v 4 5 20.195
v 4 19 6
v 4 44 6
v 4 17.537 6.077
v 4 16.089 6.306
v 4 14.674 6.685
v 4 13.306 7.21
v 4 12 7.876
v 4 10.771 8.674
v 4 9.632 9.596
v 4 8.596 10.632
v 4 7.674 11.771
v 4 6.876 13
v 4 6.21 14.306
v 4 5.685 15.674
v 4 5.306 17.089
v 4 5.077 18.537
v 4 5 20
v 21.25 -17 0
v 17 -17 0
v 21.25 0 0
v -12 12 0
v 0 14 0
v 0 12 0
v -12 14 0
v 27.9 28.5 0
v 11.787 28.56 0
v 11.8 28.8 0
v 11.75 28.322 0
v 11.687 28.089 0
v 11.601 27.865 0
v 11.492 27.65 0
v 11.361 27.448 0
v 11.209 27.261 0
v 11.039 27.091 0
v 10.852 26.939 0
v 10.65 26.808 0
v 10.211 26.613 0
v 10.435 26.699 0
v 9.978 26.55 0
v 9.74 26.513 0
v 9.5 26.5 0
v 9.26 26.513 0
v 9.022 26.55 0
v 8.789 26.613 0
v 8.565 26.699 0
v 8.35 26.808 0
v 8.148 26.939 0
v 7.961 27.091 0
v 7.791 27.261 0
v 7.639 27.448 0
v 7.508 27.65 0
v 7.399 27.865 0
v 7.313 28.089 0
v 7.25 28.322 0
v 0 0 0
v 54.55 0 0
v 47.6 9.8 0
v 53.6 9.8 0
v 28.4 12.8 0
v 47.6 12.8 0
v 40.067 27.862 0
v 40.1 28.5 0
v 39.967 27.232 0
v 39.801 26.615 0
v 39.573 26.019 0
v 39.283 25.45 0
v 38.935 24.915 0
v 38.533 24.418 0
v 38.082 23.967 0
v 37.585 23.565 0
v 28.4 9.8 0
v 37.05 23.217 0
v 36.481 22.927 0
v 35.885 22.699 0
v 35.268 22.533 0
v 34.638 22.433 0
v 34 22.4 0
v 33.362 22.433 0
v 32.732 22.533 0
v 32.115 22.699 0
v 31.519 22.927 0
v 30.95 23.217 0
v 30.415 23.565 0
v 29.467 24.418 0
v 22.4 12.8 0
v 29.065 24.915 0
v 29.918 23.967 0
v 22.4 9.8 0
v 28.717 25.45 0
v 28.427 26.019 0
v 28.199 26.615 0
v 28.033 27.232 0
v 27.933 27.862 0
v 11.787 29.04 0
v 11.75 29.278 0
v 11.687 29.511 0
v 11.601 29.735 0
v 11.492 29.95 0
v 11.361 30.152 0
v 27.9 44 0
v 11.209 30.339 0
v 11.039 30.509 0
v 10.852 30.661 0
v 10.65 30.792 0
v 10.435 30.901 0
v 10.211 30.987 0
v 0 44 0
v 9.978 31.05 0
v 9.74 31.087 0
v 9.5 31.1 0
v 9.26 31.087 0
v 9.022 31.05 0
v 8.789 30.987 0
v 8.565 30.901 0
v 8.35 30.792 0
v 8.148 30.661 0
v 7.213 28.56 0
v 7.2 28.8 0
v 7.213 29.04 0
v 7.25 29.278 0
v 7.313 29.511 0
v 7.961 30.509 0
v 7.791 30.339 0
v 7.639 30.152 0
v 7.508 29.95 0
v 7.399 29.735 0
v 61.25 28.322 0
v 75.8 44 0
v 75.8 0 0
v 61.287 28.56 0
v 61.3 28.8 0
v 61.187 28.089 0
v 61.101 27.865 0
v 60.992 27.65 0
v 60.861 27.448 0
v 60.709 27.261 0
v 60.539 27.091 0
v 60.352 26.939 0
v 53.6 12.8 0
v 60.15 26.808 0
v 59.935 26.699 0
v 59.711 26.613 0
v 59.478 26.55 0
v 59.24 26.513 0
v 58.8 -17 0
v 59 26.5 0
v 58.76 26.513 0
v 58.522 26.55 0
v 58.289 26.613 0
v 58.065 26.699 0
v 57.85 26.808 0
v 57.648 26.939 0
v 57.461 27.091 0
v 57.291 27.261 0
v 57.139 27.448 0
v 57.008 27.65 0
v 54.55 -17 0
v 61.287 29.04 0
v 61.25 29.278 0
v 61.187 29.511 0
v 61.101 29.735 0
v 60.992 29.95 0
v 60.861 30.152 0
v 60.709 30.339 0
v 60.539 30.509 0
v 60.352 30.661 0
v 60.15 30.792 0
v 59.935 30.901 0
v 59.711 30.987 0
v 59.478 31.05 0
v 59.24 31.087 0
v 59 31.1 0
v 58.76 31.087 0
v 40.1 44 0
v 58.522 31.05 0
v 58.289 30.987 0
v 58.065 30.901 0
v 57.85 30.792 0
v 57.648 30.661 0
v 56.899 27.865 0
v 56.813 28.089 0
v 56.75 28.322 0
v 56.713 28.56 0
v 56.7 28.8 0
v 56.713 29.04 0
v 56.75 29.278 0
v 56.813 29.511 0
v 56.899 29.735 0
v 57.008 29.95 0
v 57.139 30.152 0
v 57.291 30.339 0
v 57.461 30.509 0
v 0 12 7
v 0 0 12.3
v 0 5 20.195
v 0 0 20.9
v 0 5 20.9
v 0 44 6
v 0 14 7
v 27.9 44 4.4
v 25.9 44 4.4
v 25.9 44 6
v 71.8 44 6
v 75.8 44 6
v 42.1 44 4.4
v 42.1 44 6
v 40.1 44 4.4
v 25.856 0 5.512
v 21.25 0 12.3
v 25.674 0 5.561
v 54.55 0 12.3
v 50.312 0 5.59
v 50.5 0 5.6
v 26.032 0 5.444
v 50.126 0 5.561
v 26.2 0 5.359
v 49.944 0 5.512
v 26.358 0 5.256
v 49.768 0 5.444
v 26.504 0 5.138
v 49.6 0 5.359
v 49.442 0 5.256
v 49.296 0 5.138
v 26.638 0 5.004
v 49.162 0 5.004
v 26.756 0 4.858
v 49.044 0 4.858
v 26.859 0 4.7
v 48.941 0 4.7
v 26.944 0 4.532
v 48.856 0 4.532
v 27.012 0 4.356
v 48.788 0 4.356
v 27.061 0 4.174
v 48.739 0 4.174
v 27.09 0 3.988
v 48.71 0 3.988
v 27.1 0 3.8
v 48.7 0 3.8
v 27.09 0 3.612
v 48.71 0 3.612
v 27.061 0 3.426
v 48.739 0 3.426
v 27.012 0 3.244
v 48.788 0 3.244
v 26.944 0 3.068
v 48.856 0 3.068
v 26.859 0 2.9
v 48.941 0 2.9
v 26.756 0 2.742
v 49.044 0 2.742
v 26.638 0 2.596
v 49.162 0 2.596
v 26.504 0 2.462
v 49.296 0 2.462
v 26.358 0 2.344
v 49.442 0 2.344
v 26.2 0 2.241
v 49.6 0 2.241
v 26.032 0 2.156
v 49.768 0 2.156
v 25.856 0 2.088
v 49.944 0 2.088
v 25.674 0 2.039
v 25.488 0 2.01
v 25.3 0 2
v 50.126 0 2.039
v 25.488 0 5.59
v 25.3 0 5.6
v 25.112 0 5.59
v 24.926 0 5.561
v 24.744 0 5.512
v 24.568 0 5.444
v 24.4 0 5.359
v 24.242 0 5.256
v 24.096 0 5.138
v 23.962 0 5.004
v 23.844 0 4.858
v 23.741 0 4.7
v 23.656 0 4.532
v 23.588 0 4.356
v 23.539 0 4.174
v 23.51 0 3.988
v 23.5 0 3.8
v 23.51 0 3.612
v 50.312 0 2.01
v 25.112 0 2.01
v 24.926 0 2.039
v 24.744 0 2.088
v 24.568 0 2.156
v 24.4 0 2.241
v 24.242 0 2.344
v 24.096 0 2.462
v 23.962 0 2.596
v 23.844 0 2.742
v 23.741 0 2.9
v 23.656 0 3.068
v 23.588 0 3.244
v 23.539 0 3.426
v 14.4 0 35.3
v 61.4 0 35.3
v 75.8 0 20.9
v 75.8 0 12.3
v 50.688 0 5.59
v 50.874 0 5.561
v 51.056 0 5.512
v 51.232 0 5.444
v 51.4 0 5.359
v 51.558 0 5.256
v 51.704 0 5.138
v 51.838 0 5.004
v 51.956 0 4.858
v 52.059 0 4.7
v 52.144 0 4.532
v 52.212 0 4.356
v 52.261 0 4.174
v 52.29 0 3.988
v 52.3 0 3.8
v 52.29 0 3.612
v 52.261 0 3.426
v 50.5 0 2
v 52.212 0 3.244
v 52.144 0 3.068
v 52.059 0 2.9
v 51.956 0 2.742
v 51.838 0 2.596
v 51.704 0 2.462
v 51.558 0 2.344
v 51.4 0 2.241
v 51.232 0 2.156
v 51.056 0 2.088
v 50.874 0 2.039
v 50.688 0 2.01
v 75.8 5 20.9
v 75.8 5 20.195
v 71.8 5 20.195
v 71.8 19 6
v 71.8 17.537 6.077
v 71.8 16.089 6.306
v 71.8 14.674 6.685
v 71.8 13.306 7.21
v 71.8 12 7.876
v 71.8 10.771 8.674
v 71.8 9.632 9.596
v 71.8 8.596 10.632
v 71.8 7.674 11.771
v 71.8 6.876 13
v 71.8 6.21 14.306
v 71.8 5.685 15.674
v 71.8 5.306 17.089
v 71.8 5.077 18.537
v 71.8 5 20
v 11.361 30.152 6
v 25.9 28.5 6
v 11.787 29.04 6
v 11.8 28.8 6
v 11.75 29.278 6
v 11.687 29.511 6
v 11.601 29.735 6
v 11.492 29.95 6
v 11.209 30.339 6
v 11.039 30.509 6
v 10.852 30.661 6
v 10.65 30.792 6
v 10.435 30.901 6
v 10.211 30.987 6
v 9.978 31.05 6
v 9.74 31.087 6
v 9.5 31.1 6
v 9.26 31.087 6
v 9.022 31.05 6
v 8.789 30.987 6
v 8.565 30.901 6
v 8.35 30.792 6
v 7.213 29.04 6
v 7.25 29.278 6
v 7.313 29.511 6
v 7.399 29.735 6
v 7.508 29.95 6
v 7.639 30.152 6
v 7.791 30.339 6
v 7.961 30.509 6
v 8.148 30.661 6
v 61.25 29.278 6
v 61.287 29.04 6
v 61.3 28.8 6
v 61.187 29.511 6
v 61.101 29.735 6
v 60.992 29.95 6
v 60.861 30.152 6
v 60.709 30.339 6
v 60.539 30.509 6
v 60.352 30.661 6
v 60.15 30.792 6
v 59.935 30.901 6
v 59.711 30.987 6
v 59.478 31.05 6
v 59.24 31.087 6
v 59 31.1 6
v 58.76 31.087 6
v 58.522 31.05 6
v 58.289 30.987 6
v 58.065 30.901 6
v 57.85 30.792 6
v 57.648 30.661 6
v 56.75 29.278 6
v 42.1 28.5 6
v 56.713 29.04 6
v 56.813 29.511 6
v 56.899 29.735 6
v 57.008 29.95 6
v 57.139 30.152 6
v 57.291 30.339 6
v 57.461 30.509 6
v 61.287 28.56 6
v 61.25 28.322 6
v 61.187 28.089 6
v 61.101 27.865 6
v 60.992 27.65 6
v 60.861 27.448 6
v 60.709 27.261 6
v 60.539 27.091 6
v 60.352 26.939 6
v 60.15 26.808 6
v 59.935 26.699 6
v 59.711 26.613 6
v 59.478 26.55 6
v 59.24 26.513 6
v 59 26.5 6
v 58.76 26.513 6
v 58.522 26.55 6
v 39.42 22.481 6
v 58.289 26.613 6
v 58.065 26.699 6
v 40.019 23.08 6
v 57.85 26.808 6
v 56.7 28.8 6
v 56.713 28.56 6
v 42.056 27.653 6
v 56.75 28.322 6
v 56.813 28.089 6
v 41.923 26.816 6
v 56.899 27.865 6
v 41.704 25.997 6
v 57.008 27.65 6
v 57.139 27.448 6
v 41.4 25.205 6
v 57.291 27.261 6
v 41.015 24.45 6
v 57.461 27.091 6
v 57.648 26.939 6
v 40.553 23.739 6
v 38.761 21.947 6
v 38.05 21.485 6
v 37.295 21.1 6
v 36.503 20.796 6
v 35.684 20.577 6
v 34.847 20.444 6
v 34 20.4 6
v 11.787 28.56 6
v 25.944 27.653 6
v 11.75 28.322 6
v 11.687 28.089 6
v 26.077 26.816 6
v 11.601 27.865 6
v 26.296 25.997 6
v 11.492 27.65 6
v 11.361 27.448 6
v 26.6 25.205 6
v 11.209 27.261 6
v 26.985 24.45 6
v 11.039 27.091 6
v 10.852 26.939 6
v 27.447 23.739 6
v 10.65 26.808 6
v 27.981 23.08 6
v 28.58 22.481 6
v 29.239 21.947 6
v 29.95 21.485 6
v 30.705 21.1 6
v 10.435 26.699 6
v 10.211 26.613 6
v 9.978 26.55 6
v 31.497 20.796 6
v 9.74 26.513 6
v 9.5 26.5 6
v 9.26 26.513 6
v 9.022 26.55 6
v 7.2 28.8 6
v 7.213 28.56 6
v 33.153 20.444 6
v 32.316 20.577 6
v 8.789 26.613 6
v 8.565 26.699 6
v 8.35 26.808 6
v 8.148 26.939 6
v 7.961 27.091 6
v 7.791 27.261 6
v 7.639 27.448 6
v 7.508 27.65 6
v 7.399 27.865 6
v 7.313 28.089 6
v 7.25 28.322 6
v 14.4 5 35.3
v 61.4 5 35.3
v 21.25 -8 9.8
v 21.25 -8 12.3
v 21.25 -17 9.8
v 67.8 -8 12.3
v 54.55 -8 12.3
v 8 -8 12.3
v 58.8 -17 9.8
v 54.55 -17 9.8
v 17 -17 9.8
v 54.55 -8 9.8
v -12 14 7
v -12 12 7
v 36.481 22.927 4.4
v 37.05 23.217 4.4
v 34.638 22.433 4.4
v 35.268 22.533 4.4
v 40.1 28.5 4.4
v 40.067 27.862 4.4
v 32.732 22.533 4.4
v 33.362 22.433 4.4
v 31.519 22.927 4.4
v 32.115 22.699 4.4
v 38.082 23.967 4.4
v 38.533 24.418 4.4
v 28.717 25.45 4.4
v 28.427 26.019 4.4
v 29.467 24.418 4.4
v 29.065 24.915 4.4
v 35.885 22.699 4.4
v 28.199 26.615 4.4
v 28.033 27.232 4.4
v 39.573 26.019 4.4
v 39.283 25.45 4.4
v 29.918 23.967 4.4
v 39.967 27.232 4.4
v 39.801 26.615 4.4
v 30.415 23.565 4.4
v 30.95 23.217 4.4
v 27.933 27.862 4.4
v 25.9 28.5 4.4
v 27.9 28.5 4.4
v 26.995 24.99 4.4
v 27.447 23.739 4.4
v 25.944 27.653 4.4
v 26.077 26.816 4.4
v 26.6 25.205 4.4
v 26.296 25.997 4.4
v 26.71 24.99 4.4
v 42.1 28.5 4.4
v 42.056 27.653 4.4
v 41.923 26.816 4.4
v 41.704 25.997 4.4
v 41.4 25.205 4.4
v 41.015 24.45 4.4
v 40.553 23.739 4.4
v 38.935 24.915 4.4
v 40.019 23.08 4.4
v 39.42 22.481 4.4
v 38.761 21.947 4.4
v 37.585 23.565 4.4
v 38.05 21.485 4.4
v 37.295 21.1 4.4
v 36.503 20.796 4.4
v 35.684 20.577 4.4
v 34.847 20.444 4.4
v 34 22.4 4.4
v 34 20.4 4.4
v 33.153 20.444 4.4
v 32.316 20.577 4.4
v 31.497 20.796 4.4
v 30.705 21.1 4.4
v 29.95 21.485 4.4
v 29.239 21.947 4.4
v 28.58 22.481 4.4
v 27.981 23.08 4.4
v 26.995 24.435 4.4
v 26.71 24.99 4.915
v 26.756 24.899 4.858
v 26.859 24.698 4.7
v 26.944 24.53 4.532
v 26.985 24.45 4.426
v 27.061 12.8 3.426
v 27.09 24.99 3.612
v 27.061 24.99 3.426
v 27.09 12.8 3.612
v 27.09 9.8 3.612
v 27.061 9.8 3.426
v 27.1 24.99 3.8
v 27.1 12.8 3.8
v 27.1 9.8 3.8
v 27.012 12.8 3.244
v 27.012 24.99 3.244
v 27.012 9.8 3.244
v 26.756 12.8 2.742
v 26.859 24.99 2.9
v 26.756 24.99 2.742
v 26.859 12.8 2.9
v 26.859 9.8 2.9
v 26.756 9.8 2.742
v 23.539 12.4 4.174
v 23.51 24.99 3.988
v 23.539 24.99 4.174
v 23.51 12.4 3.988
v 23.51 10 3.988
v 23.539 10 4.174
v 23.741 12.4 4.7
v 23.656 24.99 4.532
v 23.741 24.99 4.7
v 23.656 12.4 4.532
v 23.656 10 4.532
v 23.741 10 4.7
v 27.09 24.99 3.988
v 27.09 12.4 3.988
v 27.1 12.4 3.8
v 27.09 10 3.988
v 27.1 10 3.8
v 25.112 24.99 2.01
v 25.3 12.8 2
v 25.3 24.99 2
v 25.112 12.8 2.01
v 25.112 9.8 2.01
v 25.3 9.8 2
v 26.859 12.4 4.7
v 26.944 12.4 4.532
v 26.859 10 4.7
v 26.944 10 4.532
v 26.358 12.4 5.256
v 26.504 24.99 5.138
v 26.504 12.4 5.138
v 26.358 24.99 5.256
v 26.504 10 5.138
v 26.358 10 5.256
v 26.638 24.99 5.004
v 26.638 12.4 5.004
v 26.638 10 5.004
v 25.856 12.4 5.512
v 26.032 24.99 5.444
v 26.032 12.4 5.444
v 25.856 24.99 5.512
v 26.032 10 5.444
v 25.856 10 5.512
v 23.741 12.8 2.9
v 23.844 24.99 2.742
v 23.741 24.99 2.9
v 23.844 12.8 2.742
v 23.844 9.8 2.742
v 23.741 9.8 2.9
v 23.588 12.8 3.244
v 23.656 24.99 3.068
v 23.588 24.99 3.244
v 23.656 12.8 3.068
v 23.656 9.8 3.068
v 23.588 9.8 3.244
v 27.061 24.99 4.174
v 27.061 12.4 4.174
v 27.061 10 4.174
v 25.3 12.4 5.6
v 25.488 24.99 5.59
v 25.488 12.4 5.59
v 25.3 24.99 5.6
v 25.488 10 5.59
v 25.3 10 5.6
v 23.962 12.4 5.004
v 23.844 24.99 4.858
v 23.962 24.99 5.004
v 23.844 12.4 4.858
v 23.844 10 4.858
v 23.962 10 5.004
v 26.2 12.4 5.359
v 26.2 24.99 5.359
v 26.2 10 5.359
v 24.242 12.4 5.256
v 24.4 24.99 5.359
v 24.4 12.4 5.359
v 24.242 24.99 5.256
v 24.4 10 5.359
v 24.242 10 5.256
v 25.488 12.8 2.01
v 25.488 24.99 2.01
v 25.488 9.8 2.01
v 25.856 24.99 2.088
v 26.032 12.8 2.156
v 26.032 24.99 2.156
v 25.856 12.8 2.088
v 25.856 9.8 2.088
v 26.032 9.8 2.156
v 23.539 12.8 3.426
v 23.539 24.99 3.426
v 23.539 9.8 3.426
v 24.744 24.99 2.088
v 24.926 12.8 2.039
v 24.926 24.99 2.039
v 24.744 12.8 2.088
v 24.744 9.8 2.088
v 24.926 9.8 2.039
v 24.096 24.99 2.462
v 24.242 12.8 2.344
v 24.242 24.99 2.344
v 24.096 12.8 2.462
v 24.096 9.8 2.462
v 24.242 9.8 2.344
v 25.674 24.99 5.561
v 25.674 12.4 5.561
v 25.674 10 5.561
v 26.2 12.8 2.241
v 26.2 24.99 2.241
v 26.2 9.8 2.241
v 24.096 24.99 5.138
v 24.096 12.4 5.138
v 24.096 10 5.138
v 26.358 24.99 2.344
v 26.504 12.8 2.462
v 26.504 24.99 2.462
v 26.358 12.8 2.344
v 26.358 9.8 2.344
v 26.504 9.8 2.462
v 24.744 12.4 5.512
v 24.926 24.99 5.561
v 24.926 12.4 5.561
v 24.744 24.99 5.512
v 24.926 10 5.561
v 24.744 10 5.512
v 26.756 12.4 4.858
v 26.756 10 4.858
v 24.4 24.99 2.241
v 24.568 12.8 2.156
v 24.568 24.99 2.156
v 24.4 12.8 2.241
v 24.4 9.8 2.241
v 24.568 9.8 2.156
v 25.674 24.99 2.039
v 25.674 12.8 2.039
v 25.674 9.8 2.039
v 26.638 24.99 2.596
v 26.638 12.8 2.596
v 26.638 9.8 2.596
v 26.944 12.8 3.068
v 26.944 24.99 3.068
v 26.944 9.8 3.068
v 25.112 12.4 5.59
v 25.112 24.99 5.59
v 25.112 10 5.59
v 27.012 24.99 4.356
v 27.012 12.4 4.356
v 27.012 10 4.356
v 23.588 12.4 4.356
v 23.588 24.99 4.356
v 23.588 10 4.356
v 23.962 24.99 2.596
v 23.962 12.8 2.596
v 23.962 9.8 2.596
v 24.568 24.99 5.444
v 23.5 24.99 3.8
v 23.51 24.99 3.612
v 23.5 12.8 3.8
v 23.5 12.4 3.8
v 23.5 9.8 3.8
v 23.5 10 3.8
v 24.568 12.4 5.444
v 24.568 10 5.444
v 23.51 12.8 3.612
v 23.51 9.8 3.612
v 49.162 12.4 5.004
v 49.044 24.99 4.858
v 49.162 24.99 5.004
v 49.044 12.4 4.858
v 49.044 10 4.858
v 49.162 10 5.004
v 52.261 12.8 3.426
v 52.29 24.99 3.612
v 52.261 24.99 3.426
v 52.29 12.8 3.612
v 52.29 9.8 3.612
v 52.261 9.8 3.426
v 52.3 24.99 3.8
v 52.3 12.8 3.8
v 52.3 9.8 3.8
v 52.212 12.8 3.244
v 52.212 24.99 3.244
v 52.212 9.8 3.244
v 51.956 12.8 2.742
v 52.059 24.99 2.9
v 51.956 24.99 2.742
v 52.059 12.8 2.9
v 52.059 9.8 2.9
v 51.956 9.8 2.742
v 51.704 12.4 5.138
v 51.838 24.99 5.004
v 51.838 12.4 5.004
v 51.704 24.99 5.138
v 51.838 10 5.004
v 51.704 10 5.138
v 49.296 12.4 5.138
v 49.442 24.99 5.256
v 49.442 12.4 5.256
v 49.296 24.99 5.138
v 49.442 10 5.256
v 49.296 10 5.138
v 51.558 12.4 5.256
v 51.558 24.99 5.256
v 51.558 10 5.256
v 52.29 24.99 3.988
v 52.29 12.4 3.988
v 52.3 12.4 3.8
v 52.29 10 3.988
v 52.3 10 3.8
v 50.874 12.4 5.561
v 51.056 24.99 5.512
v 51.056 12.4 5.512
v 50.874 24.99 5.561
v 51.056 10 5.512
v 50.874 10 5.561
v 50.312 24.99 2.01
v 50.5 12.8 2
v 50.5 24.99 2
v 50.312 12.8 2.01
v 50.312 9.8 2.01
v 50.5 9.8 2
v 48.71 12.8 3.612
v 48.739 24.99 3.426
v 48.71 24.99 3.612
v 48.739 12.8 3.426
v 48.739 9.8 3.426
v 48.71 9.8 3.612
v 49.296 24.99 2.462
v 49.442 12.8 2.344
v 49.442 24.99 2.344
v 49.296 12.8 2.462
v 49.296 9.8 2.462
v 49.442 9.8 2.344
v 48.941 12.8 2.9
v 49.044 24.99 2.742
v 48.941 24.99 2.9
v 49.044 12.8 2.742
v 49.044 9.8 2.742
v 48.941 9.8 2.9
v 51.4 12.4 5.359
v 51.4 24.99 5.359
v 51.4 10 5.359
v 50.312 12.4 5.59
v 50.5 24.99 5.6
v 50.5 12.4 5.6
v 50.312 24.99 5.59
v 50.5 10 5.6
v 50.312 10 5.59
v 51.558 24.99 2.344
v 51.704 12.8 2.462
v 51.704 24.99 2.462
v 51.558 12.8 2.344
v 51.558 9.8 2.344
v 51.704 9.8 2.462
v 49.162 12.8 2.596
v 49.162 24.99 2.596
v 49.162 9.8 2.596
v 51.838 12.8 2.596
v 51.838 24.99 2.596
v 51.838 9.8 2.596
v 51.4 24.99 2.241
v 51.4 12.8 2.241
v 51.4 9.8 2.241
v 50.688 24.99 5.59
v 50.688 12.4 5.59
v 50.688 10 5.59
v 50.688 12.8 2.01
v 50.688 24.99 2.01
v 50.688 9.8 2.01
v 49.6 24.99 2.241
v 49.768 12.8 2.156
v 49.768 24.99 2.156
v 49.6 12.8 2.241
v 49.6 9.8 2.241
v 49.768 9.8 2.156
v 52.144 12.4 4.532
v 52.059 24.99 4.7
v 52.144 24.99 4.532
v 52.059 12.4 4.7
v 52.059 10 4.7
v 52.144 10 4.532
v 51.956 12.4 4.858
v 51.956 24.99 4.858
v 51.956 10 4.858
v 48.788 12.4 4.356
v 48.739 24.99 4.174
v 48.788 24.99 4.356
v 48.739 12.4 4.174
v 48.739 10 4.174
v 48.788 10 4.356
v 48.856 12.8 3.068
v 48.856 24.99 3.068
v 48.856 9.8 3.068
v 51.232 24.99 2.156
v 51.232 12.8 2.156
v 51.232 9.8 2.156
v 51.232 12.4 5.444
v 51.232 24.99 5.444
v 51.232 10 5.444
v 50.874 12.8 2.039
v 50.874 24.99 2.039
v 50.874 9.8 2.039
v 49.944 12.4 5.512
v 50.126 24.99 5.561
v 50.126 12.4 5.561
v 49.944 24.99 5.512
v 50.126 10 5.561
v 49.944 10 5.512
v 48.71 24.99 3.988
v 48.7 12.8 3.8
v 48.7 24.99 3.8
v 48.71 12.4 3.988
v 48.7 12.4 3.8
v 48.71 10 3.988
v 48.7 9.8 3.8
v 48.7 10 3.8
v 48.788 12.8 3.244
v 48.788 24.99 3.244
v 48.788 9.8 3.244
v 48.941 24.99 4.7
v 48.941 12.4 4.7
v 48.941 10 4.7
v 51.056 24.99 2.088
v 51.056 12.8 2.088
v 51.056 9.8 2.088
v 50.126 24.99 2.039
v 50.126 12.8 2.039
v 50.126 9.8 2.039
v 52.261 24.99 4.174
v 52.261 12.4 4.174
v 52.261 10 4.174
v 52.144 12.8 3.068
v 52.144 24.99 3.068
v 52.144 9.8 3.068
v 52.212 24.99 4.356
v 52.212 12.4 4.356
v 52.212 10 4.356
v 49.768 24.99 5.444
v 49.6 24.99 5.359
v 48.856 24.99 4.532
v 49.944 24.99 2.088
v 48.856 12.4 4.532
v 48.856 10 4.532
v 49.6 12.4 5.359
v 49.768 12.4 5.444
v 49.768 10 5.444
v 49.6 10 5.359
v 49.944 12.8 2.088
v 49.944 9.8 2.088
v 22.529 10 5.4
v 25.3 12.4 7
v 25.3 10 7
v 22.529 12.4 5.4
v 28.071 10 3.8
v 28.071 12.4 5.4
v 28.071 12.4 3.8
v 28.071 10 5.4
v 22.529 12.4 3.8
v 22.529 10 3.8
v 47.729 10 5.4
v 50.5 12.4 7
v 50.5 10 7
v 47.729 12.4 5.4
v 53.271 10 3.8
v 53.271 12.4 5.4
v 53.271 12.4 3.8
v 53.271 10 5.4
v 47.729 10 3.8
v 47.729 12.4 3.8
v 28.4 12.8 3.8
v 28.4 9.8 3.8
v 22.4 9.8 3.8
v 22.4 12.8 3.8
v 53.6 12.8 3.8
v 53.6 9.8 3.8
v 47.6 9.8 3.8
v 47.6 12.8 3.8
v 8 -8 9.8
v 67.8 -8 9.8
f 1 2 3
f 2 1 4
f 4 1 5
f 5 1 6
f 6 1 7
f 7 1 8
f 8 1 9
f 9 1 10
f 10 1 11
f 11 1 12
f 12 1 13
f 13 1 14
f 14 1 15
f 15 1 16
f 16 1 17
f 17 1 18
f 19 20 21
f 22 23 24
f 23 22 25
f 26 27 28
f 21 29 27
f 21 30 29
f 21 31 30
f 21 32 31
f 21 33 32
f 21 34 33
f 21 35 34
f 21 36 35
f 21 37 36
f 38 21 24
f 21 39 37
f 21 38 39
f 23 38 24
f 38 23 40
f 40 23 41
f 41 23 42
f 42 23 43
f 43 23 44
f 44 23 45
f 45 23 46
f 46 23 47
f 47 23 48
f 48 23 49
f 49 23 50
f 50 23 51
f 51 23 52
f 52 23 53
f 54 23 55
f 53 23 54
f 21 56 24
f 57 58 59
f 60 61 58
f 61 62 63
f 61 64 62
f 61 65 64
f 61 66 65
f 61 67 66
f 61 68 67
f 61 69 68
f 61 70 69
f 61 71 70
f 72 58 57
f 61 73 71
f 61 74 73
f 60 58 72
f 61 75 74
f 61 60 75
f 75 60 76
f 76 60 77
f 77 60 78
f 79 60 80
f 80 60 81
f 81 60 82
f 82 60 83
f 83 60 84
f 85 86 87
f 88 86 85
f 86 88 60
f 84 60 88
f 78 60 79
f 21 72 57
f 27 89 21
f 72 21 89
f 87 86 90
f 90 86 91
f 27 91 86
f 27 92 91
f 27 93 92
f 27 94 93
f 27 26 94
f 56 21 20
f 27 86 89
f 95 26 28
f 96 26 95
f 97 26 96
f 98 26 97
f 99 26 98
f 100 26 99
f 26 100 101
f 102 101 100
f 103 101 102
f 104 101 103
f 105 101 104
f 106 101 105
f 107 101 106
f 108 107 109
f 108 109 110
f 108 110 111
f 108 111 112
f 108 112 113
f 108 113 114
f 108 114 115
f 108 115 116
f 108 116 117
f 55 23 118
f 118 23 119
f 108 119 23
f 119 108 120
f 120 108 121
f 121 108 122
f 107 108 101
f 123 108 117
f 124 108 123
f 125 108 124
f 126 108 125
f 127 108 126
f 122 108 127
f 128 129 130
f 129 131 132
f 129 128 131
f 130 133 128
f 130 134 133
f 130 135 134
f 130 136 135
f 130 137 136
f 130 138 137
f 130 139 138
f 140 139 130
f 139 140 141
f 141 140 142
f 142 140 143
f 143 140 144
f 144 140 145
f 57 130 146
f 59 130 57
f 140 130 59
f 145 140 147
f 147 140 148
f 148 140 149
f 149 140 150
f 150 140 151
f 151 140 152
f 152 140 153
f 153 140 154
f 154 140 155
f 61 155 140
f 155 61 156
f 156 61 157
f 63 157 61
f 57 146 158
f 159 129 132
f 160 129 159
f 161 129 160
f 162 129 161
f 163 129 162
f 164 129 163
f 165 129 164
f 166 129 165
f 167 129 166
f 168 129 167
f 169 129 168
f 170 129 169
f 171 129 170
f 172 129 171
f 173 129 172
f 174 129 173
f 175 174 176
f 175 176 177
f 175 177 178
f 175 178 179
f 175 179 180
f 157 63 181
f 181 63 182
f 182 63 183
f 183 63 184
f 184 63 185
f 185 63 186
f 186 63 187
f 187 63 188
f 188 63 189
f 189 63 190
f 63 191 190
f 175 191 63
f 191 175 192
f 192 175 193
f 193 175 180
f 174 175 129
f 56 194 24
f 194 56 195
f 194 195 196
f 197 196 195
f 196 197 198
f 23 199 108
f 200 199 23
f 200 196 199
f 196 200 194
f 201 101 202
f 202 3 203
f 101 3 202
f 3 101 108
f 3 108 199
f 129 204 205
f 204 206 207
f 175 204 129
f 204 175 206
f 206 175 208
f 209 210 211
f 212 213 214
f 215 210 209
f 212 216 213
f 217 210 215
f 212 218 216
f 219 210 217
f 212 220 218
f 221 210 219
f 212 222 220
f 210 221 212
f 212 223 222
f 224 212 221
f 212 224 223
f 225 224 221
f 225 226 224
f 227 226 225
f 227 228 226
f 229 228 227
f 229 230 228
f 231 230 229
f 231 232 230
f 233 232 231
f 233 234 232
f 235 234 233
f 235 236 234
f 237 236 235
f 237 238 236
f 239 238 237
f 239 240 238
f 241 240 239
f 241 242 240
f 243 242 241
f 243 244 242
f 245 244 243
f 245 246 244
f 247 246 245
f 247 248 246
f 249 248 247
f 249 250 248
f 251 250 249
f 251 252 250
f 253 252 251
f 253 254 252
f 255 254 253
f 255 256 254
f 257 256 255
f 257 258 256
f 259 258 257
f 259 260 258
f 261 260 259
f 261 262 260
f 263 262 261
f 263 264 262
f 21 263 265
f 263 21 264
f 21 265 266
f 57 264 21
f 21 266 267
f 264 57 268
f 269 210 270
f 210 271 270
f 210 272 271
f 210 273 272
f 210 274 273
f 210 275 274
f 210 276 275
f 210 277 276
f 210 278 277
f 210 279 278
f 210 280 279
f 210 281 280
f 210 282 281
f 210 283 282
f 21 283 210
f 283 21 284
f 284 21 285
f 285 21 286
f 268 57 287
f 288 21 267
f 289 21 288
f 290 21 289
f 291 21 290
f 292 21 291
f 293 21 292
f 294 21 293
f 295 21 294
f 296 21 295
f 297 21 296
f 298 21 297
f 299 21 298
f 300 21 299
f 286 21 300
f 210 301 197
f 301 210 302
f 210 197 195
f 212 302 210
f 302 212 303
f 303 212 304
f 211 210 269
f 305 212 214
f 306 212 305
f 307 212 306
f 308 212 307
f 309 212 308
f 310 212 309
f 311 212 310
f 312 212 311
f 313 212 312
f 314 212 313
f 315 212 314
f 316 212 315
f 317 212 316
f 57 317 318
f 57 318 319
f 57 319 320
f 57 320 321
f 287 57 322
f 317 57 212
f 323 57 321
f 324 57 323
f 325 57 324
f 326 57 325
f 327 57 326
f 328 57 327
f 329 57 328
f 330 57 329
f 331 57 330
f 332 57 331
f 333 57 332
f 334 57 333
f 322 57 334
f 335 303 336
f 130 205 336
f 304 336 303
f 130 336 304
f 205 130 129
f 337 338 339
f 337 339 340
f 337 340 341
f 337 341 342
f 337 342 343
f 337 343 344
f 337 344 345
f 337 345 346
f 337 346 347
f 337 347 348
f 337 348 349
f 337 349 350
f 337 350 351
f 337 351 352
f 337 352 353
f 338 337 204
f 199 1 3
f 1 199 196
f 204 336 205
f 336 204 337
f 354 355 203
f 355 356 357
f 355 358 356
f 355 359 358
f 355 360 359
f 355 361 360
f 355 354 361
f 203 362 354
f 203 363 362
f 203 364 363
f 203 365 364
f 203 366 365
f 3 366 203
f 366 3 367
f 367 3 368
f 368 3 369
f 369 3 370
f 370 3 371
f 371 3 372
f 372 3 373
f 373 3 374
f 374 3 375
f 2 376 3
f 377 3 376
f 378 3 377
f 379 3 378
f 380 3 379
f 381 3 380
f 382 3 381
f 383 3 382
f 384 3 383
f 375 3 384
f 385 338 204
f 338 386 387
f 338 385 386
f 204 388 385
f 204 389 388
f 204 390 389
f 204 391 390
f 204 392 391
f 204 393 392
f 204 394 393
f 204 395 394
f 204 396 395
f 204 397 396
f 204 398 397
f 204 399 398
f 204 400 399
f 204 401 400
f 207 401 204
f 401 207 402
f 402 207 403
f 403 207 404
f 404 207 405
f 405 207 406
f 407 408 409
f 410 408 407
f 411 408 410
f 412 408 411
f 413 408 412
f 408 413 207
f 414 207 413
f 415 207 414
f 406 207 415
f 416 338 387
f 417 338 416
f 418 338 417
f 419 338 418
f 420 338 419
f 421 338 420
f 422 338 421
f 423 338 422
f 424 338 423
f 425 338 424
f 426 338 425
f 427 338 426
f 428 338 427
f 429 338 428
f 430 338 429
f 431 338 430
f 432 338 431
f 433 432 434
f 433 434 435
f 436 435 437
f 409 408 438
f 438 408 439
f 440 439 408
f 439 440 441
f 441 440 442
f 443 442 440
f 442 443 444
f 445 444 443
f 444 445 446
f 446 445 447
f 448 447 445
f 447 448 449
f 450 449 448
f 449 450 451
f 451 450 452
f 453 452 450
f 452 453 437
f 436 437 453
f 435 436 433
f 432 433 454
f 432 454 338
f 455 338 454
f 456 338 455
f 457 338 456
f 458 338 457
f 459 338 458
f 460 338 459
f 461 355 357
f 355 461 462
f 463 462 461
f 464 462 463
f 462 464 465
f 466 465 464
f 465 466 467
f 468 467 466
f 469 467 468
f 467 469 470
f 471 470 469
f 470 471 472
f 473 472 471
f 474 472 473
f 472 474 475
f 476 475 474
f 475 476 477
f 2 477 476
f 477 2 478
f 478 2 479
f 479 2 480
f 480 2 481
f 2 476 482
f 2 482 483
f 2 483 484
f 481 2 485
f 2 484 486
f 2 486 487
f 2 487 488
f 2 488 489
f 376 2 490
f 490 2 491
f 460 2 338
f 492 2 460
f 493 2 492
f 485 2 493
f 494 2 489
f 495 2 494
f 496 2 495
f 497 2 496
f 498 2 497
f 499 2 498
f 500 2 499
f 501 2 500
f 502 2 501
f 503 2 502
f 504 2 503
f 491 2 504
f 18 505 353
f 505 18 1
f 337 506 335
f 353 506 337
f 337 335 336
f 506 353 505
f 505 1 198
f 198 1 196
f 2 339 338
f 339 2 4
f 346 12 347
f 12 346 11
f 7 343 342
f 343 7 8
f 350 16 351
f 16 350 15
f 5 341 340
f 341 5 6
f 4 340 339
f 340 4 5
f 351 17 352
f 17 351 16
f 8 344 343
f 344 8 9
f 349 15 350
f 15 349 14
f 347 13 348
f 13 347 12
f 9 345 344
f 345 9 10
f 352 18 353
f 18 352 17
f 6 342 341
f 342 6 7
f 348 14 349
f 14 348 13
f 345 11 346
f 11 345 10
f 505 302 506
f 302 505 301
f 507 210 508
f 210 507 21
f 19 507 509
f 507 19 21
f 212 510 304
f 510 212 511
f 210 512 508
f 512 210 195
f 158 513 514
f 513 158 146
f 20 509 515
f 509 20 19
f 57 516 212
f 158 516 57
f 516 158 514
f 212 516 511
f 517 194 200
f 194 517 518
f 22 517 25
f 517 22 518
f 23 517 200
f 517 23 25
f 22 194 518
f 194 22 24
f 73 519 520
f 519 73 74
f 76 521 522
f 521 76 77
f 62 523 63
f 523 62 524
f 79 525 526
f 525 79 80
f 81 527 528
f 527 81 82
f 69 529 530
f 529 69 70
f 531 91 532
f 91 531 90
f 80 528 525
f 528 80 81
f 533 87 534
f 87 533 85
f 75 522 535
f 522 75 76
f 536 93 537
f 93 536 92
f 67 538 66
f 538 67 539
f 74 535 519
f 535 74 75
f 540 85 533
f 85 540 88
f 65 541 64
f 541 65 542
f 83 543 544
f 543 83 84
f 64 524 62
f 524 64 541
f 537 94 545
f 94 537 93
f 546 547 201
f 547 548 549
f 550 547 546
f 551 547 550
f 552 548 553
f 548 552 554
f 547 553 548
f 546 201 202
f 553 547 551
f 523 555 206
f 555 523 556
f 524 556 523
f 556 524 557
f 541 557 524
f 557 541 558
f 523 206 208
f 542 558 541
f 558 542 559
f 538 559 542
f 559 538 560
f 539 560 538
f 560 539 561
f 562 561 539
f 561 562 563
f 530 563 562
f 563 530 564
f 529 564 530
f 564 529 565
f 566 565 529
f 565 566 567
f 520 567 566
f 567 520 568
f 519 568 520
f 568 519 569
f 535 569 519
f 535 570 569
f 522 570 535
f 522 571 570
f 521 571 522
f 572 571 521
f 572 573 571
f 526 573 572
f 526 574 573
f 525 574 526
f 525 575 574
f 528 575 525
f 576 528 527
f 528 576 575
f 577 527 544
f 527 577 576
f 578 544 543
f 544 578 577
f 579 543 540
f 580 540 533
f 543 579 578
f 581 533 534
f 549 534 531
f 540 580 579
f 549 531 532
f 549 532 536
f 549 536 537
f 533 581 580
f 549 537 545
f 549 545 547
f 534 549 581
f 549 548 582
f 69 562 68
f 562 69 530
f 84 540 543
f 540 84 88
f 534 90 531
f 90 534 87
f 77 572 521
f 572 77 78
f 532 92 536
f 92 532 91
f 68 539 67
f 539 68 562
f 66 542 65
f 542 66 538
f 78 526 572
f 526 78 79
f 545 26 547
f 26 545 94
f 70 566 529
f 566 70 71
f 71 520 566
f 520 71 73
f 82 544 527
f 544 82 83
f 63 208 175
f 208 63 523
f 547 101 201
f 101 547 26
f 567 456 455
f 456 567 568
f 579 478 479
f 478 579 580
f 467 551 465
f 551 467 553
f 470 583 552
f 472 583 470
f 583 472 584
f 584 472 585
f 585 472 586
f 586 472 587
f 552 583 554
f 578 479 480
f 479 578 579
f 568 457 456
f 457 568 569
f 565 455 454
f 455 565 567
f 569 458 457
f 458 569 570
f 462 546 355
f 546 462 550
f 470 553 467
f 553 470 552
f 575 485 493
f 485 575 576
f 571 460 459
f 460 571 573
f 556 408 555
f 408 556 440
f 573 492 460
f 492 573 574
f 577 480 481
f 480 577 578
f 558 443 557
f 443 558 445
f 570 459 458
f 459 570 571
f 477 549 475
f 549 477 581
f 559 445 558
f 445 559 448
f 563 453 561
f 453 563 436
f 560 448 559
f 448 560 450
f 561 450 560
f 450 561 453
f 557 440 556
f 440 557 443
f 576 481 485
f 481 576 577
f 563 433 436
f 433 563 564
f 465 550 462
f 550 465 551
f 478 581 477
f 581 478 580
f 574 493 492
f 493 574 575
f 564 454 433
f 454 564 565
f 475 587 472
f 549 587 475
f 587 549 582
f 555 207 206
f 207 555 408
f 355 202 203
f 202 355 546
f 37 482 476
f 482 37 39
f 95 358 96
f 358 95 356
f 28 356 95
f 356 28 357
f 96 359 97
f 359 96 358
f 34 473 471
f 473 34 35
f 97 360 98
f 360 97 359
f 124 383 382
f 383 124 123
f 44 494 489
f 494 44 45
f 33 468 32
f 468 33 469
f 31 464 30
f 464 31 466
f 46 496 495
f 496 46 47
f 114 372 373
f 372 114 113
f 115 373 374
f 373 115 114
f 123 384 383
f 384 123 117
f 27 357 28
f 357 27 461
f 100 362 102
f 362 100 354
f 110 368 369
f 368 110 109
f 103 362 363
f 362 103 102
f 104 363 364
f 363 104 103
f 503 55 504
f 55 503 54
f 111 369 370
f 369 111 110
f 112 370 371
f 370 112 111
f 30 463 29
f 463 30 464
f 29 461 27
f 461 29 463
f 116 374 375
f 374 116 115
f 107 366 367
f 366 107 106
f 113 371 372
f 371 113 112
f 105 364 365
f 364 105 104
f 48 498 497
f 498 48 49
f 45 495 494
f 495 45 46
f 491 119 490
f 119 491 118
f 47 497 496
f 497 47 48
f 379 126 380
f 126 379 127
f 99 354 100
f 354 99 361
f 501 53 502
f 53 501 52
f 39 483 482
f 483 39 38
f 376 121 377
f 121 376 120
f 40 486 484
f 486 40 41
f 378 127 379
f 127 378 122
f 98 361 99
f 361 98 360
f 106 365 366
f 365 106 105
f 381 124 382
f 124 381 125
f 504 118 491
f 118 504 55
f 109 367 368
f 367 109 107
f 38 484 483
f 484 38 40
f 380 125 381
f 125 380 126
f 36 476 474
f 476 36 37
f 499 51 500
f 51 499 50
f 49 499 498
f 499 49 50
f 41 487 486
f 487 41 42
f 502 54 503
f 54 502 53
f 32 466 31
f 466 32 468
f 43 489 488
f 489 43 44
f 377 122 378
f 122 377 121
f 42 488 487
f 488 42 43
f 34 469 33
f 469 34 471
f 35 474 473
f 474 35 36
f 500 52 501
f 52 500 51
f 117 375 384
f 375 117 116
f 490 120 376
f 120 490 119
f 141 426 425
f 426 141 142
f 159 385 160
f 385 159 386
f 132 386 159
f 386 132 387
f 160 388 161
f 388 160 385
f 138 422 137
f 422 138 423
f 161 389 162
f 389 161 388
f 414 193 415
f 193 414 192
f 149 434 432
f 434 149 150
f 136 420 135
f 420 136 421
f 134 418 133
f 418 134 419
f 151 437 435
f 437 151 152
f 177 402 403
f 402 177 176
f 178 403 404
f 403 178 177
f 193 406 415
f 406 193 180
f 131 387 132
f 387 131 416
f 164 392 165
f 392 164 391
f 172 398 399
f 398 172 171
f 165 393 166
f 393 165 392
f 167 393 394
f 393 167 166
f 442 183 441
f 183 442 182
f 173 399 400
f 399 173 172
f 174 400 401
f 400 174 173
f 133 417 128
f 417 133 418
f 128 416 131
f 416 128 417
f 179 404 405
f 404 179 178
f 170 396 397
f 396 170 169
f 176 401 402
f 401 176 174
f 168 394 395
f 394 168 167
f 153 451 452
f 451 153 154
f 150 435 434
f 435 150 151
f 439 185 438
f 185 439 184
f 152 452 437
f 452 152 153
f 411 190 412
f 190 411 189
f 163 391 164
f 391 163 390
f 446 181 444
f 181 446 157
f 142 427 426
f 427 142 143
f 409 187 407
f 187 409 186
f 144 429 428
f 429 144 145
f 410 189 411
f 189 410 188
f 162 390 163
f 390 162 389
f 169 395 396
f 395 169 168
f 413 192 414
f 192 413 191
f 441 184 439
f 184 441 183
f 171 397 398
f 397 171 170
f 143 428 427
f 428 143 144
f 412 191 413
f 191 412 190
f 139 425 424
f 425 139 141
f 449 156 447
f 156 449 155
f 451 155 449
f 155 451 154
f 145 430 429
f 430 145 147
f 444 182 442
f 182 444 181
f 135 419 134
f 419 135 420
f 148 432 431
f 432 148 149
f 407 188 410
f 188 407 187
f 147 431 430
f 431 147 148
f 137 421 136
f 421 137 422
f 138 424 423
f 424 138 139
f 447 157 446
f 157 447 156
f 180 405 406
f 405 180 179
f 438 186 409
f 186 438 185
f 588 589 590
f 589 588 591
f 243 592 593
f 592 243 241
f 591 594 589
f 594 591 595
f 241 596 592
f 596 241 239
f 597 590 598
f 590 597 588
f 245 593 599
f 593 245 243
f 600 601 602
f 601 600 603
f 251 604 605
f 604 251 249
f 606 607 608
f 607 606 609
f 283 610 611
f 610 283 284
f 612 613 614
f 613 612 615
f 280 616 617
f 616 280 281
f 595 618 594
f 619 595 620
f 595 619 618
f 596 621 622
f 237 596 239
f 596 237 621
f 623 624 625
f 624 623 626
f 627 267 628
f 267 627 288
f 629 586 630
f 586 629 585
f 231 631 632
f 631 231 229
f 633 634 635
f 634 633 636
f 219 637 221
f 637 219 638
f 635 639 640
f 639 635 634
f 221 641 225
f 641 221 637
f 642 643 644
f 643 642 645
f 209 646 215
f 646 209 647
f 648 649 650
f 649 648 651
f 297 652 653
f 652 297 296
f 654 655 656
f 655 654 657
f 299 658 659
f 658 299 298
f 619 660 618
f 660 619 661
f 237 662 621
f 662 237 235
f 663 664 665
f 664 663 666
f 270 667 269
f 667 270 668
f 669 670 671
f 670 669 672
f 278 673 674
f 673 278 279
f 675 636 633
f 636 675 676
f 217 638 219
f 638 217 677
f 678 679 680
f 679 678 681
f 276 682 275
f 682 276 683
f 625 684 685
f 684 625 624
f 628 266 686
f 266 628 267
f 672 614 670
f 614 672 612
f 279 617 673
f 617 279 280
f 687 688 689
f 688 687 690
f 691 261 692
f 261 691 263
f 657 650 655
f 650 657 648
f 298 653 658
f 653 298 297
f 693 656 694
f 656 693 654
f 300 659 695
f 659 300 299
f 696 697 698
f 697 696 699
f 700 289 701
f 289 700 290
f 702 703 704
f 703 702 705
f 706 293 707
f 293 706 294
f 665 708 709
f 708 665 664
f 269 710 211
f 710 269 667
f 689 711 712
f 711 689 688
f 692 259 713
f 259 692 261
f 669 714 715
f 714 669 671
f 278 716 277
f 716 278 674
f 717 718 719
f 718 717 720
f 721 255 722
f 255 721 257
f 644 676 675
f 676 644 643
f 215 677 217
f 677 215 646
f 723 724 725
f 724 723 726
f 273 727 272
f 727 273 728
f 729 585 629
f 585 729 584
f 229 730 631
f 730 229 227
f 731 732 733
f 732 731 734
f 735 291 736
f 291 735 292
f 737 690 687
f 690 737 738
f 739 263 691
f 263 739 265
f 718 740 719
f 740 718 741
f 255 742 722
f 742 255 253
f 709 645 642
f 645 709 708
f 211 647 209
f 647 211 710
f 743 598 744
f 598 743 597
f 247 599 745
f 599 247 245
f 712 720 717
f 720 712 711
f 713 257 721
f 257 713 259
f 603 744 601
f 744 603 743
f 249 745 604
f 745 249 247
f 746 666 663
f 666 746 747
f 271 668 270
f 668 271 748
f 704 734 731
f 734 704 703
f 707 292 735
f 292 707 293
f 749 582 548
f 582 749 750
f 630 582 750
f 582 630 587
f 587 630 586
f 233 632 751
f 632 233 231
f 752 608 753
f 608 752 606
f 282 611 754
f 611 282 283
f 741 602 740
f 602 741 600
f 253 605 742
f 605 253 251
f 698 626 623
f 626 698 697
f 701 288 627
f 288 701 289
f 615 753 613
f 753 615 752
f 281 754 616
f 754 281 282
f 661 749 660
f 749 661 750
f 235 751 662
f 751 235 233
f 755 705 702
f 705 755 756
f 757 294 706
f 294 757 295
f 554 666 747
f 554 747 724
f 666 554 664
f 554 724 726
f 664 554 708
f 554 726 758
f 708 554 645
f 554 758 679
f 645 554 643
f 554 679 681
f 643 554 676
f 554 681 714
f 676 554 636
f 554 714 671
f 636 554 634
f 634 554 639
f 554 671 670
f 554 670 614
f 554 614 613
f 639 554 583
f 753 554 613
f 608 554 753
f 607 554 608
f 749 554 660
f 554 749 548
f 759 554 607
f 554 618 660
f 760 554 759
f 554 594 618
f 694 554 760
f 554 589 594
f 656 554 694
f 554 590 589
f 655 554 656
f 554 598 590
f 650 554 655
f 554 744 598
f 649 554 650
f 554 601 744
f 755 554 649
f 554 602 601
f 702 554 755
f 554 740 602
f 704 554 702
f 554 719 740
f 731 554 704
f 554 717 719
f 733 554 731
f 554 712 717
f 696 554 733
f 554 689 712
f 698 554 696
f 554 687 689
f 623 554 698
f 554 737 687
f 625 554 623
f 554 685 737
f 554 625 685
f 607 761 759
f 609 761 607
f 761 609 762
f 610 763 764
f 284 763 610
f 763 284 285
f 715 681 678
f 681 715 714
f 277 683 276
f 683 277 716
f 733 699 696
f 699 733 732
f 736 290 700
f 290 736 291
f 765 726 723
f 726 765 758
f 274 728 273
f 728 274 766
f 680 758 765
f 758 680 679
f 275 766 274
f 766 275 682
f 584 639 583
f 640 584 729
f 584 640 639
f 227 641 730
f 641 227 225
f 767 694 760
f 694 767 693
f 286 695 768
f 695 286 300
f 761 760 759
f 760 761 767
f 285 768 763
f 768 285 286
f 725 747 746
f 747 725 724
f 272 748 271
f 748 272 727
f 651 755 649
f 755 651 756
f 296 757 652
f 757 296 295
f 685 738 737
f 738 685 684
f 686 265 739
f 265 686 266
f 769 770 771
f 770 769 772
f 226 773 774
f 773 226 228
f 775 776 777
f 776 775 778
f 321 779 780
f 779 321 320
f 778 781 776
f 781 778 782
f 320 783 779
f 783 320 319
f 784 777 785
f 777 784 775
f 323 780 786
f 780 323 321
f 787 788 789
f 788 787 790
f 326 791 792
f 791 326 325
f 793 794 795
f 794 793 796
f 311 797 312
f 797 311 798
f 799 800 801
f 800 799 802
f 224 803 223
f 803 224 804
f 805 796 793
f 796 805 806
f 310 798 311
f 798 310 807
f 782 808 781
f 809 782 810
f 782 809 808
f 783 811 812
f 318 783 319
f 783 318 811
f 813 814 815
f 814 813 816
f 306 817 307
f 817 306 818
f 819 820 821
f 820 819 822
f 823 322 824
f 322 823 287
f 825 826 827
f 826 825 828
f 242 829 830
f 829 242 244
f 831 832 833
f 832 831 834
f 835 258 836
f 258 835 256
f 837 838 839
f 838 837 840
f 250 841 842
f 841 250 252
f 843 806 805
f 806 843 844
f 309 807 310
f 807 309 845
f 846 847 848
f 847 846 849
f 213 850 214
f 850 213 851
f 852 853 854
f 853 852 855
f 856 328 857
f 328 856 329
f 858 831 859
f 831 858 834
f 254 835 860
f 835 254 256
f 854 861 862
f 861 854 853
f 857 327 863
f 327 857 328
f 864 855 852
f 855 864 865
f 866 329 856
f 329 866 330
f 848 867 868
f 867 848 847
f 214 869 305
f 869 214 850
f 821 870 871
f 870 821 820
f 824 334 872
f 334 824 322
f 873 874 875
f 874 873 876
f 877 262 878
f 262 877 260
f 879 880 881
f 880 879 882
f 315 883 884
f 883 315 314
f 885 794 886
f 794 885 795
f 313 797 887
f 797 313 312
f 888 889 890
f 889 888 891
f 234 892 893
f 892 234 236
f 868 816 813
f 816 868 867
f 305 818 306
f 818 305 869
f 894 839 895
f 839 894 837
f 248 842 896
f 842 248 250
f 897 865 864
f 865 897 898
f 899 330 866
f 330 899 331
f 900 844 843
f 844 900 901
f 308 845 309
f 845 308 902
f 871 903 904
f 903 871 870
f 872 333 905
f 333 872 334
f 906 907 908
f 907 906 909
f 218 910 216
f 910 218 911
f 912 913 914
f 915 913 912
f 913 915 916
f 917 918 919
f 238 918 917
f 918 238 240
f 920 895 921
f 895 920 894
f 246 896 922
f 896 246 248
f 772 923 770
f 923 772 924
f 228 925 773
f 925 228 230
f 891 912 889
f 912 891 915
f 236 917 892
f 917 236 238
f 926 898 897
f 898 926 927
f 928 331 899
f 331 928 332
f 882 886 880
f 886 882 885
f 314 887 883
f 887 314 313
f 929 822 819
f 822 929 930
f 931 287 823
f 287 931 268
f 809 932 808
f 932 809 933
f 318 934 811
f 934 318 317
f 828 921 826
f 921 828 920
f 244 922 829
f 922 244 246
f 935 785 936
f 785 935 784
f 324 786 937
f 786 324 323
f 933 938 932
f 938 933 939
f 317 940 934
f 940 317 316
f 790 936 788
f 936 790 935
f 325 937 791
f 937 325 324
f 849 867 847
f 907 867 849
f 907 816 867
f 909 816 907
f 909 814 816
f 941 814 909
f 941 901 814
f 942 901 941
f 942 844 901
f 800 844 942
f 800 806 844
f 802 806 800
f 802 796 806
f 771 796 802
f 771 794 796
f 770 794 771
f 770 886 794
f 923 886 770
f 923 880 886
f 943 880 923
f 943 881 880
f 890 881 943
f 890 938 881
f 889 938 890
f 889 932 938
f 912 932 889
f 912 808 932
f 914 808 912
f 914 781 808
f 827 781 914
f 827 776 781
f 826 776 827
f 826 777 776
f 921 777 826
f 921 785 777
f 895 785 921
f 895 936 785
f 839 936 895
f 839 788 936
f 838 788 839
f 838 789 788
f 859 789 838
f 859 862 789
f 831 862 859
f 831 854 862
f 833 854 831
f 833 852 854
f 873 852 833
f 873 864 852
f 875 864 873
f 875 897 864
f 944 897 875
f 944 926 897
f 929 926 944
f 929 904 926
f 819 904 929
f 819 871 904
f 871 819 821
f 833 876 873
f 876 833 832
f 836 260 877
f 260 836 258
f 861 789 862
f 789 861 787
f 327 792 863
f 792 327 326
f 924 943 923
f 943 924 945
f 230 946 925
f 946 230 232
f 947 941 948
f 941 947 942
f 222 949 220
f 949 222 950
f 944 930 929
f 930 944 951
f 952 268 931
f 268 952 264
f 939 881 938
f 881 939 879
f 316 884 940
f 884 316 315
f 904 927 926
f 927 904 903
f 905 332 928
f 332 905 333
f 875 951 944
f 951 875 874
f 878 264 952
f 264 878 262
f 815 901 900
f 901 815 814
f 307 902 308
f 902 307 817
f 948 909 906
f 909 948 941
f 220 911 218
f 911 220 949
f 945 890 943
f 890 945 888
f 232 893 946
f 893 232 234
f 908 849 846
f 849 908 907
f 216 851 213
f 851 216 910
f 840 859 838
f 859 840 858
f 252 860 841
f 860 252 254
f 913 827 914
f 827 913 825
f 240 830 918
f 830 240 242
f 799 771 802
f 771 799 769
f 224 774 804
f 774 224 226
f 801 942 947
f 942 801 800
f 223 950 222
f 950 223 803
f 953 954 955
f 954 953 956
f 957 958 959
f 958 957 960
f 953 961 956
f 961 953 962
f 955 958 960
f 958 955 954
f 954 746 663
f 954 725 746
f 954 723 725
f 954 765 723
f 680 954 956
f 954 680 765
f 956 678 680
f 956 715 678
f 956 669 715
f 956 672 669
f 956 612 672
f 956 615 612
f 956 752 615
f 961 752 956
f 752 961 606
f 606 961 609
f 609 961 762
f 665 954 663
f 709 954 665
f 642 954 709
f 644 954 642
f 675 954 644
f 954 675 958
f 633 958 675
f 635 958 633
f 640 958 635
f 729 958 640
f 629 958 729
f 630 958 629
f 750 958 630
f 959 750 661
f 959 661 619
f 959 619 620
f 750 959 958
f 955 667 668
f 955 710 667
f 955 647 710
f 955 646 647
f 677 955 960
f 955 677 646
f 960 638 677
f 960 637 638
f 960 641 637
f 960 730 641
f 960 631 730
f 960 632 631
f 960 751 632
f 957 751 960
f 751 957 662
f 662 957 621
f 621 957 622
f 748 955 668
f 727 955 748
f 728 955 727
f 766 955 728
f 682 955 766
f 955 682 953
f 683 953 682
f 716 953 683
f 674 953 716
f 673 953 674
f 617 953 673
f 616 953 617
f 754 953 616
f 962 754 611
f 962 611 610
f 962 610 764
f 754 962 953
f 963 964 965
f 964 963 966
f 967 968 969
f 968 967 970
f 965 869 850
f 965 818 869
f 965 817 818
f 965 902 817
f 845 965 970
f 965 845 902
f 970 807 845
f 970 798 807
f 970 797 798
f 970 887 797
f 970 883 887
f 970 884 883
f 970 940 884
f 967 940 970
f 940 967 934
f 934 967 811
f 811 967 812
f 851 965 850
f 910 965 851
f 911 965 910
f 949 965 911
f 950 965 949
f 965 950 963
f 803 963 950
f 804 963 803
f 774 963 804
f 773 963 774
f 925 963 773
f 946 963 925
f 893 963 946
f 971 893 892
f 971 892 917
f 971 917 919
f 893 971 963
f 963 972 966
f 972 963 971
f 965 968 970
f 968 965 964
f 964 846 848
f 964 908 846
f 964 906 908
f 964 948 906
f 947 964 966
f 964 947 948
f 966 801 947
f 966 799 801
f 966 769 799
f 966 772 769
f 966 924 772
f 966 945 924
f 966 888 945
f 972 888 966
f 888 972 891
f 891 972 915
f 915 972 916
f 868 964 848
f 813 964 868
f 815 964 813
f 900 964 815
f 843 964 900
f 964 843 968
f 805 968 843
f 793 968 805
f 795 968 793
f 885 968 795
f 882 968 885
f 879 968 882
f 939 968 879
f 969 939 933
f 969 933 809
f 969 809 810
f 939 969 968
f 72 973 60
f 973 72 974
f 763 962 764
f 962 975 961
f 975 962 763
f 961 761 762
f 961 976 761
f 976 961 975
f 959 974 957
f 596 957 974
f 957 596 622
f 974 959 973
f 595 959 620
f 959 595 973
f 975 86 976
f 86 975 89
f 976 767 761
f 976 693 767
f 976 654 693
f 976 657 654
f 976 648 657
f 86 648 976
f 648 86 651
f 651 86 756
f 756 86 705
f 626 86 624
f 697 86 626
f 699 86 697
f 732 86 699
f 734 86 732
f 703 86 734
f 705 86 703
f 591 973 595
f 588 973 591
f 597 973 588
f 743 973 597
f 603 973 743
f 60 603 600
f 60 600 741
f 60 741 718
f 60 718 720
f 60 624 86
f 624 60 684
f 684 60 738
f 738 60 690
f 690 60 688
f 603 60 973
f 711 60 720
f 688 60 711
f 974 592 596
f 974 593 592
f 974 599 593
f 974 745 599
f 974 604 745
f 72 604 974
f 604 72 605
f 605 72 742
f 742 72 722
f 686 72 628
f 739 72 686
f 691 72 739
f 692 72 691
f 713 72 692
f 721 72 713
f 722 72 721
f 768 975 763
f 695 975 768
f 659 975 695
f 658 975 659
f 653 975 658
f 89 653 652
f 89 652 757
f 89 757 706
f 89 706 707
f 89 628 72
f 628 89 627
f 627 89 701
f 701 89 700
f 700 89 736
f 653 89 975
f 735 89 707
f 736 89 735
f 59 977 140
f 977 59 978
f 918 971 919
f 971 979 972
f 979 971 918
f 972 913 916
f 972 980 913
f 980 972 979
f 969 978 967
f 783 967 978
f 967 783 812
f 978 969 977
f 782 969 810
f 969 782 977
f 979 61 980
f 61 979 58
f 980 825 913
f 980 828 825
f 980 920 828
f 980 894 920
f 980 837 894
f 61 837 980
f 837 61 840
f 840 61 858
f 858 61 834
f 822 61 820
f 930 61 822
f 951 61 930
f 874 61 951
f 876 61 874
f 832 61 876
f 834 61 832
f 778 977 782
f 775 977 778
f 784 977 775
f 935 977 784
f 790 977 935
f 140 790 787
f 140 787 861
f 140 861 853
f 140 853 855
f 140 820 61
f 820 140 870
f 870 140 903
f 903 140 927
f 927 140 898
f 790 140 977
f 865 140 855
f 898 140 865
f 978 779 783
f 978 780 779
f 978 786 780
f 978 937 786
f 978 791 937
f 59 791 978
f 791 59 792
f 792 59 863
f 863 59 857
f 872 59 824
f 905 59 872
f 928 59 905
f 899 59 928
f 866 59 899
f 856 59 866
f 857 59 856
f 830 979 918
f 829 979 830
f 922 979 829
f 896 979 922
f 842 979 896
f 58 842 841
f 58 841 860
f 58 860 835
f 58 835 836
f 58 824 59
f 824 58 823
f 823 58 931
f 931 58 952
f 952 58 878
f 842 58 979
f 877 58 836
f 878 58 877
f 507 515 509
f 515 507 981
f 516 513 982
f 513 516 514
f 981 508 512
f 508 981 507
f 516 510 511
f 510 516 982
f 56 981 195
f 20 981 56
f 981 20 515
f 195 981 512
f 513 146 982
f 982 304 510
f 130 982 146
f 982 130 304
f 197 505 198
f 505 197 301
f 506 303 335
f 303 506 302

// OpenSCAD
// file: nuts_and_bolts.scad
// Copyright 2010 D1plo1d

// This library is dual licensed under the GPL 3.0 and the GNU Lesser General Public License as per http://creativecommons.org/licenses/LGPL/2.1/ .

//testNutsAndBolts();

module SKIPtestNutsAndBolts()
{
	$fn = 360;
	translate([0,15])nutHole(3, proj=2);
	boltHole(3, length= 30, proj=2);
}

MM = "mm";
INCH = "inch"; //Not yet supported

//Based on: http://www.roymech.co.uk/Useful_Tables/Screws/Hex_Screws.htm
METRIC_NUT_AC_WIDTHS =
[
	-1, //0 index is not used but reduces computation
	-1,
	-1,
	6.40,//m3
	8.10,//m4
	9.20,//m5
	11.50,//m6
	-1,
	15.00,//m8
	-1,
	19.60,//m10
	-1,
	22.10,//m12
	-1,
	-1,
	-1,
	27.70,//m16
	-1,
	-1,
	-1,
	34.60,//m20
	-1,
	-1,
	-1,
	41.60,//m24
	-1,
	-1,
	-1,
	-1,
	-1,
	53.1,//m30
	-1,
	-1,
	-1,
	-1,
	-1,
	63.5//m36
];
METRIC_NUT_THICKNESS =
[
	-1, //0 index is not used but reduces computation
	-1,
	-1,
	2.40,//m3
	3.20,//m4
	4.00,//m5
	5.00,//m6
	-1,
	6.50,//m8
	-1,
	8.00,//m10
	-1,
	10.00,//m12
	-1,
	-1,
	-1,
	13.00,//m16
	-1,
	-1,
	-1,
	16.00//m20
	-1,
	-1,
	-1,
	19.00,//m24
	-1,
	-1,
	-1,
	-1,
	-1,
	24.00,//m30
	-1,
	-1,
	-1,
	-1,
	-1,
	29.00//m36
];

COURSE_METRIC_BOLT_MAJOR_THREAD_DIAMETERS =
[//based on max values
	-1, //0 index is not used but reduces computation
	-1,
	-1,
	2.98,//m3
	3.978,//m4
	4.976,//m5
	5.974,//m6
	-1,
	7.972,//m8
	-1,
	9.968,//m10
	-1,
	11.966,//m12
	-1,
	-1,
	-1,
	15.962,//m16
	-1,
	-1,
	-1,
	19.958,//m20
	-1,
	-1,
	-1,
	23.952,//m24
	-1,
	-1,
	-1,
	-1,
	-1,
	29.947,//m30
	-1,
	-1,
	-1,
	-1,
	-1,
	35.940//m36
];

module nutHole(size, units=MM, tolerance = +0.0001, proj = -1)
{
	//takes a metric screw/nut size and looksup nut dimensions
	radius = METRIC_NUT_AC_WIDTHS[size]/2+tolerance;
	height = METRIC_NUT_THICKNESS[size]+tolerance;
	if (proj == -1)
	{
		cylinder(r= radius, h=height, $fn = 6, center=[0,0]);
	}
	if (proj == 1)
	{
		circle(r= radius, $fn = 6);
	}
	if (proj == 2)
	{
		translate([-radius/2, 0])
			square([radius*2, height]);
	}
}

module boltHole(size, units=MM, length, tolerance = +0.0001, proj = -1)
{
	radius = COURSE_METRIC_BOLT_MAJOR_THREAD_DIAMETERS[size]/2+tolerance;
//TODO: proper screw cap values
	capHeight = METRIC_NUT_THICKNESS[size]+tolerance; //METRIC_BOLT_CAP_HEIGHTS[size]+tolerance;
	capRadius = METRIC_NUT_AC_WIDTHS[size]/2+tolerance; //METRIC_BOLT_CAP_RADIUS[size]+tolerance;

	if (proj == -1)
	{
	translate([0, 0, -capHeight])
		cylinder(r= capRadius, h=capHeight);
	cylinder(r = radius, h = length);
	}
	if (proj == 1)
	{
		circle(r = radius);
	}
	if (proj == 2)
	{
		translate([-capRadius/2, -capHeight])
			square([capRadius*2, capHeight]);
		square([radius*2, length]);
	}
}
// main file
//Greg adapter for i3 vertical carriage
use <nuts_and_bolts.scad>;


//params
tollerance = 0.2;
screw_tollerance = 0.6;

//hotend params
groove_dia = 12+tollerance;
groove_thickness = 4.40;
hotend_dia = 16+tollerance;

//greg params
greg_width = 31.5;
greg_length = 76-tollerance;
greg_screws = 4+screw_tollerance;
wheels_offset = 12.5;
hole_0_1 = 34;
hole_0_2 = 15.5;
hole_1_1 = 9.5;
hole_1_2 = 15.2;
hole_2_1 = 59;  
hole_2_2 = hole_1_2;

//adapter body param
front_plate_top_screw_offset = 2.5;
front_plate_width_up = 33.3;
front_plate_width_down = 58;
front_plate_height_up = 45;
front_plate_height_down = 23;
front_plate_thickness = 5;
belt_spacing = 2.5;
body_screws = 3+screw_tollerance;
front_plate_height = body_screws/2 + front_plate_height_down +  front_plate_top_screw_offset + 8;
plate_thickness = 6;
plate_width = greg_width + wheels_offset;
plate_length = greg_length;
side_locks_width = 17;
side_locks_length = (plate_length - front_plate_width_up) /2;
side_locks_height =  front_plate_height-front_plate_height_down;
wall_thickness = 4;
r_support = 28;
hole_distance = 25.2;
hole_h1 = 8.5;
wall_angle = 70;
fan_height = 0;
fan_screw = 0;

//module adapter_body
module adapter_body(){
	
	//extruder plate
	translate([0,0,0]) cube([plate_length,plate_width,plate_thickness]);
	
	//front plate
	translate([0,0,0]) cube([plate_length,front_plate_thickness,front_plate_height]);
	
	//side locks
	translate([0,-side_locks_width,0]) cube([side_locks_length,side_locks_width,side_locks_height]);
	translate([plate_length-side_locks_length,-side_locks_width,0]) cube([side_locks_length,side_locks_width,side_locks_height]);
	
	//side walls
	difference(){
		translate([0,0,0]) { 
			translate([0,0,0])cube([wall_thickness,plate_width,front_plate_height]);
			translate([plate_length-wall_thickness,0,0]) cube([wall_thickness,plate_width,front_plate_height]);
		}
		translate ([0,plate_width,plate_thickness])rotate(a=[wall_angle,0,0]) cube([30,34,60]);
		translate ([plate_length-wall_thickness,plate_width,plate_thickness])rotate(a=[wall_angle,0,0]) cube([30,34,60]);
	}	
	
	//corner support
	difference() {
		translate([wall_thickness,front_plate_thickness,plate_thickness]) cube([plate_length-2*wall_thickness-fan_height,r_support/2,r_support/2]);
		//corner support smoothing
		translate ([wall_thickness-0.01,r_support/2+front_plate_thickness,r_support/2+plate_thickness]) rotate(a=[0,90,0]) cylinder(r=r_support/2, h=plate_length-2*wall_thickness-fan_height+0.02, $fn=60);
	}
	
	//opto flag 
	translate([-12,plate_width-32,0]) cube([12,2,7]);
	
}



module adapter_holes(){

	//groove hole 
	translate([hole_0_1,plate_width-hole_0_2,0]) cylinder(r=groove_dia/2, h=groove_thickness, $fn=60);
	
	//groove channel
	translate([hole_0_1-groove_dia/2,plate_width-hole_0_2,0]) #cube([groove_dia,hole_0_2, groove_thickness]);
	
	//hotend hole 
	translate([hole_0_1,plate_width-hole_0_2,groove_thickness]) cylinder(r=hotend_dia/2, h=plate_thickness-groove_thickness+20, $fn=60);
	
	//hotend channel
	translate([hole_0_1-hotend_dia/2,plate_width-hole_0_2,groove_thickness])cube([hotend_dia,hole_0_2,plate_thickness- groove_thickness+20]);
	
	//greg mounting holes
	translate([hole_1_1,plate_width-hole_1_2,0]) cylinder(r=greg_screws/2, h=plate_thickness, $fn=60);
	translate([hole_2_1,plate_width-hole_2_2,0]) cylinder(r=greg_screws/2, h=plate_thickness, $fn=60);
	
	//adapter mounting holes
	translate ([plate_length/2-hole_distance/2,-0.01,side_locks_height-hole_h1]) rotate(a=[-90,00,0]) cylinder(r=body_screws/2, h=25, $fn=60);
	translate ([plate_length/2+hole_distance/2,-0.01,side_locks_height-hole_h1]) rotate(a=[-90,0,0]) cylinder(r=body_screws/2, h=25, $fn=60);
	
	//nut traps
	translate ([plate_length/2-hole_distance/2,10,side_locks_height-hole_h1]) rotate(a=[-90,90,0]) nutHole(3.40);
	translate ([plate_length/2+hole_distance/2,10,side_locks_height-hole_h1]) rotate(a=[-90,90,0]) nutHole(3.40);
	translate ([plate_length/2-hole_distance/2-2.9,9.8,side_locks_height-hole_h1-30]) cube([6,3,30]);
	translate ([plate_length/2+hole_distance/2-2.9,9.8,side_locks_height-hole_h1-30]) cube([6,3,30]);
	
	//belt spacing
	translate([0,-side_locks_width,side_locks_height-belt_spacing]) cube([plate_length,9,belt_spacing]);	
	
	//side lock corners
	rotate(a=[0,0,-135]) cube([plate_width,plate_width,30]);
	translate ([plate_length,0,0]) rotate(a=[0,0,-135]) cube([plate_width,plate_width,30]);
	
	//front plate corners 
	translate ([(plate_length-front_plate_width_down)/2+5.5,0,front_plate_height])rotate(a=[0,-90-45,0]) cube([plate_width,3*front_plate_thickness,30]);
	translate ([plate_length-(plate_length-front_plate_width_down)/2-5.5,0,front_plate_height]) rotate(a=[0,45,-0]) cube([plate_width,3*front_plate_thickness,30]);
	
}



module adapter(){
	difference(){
		adapter_body();
		adapter_holes();
	}
}

adapter();
